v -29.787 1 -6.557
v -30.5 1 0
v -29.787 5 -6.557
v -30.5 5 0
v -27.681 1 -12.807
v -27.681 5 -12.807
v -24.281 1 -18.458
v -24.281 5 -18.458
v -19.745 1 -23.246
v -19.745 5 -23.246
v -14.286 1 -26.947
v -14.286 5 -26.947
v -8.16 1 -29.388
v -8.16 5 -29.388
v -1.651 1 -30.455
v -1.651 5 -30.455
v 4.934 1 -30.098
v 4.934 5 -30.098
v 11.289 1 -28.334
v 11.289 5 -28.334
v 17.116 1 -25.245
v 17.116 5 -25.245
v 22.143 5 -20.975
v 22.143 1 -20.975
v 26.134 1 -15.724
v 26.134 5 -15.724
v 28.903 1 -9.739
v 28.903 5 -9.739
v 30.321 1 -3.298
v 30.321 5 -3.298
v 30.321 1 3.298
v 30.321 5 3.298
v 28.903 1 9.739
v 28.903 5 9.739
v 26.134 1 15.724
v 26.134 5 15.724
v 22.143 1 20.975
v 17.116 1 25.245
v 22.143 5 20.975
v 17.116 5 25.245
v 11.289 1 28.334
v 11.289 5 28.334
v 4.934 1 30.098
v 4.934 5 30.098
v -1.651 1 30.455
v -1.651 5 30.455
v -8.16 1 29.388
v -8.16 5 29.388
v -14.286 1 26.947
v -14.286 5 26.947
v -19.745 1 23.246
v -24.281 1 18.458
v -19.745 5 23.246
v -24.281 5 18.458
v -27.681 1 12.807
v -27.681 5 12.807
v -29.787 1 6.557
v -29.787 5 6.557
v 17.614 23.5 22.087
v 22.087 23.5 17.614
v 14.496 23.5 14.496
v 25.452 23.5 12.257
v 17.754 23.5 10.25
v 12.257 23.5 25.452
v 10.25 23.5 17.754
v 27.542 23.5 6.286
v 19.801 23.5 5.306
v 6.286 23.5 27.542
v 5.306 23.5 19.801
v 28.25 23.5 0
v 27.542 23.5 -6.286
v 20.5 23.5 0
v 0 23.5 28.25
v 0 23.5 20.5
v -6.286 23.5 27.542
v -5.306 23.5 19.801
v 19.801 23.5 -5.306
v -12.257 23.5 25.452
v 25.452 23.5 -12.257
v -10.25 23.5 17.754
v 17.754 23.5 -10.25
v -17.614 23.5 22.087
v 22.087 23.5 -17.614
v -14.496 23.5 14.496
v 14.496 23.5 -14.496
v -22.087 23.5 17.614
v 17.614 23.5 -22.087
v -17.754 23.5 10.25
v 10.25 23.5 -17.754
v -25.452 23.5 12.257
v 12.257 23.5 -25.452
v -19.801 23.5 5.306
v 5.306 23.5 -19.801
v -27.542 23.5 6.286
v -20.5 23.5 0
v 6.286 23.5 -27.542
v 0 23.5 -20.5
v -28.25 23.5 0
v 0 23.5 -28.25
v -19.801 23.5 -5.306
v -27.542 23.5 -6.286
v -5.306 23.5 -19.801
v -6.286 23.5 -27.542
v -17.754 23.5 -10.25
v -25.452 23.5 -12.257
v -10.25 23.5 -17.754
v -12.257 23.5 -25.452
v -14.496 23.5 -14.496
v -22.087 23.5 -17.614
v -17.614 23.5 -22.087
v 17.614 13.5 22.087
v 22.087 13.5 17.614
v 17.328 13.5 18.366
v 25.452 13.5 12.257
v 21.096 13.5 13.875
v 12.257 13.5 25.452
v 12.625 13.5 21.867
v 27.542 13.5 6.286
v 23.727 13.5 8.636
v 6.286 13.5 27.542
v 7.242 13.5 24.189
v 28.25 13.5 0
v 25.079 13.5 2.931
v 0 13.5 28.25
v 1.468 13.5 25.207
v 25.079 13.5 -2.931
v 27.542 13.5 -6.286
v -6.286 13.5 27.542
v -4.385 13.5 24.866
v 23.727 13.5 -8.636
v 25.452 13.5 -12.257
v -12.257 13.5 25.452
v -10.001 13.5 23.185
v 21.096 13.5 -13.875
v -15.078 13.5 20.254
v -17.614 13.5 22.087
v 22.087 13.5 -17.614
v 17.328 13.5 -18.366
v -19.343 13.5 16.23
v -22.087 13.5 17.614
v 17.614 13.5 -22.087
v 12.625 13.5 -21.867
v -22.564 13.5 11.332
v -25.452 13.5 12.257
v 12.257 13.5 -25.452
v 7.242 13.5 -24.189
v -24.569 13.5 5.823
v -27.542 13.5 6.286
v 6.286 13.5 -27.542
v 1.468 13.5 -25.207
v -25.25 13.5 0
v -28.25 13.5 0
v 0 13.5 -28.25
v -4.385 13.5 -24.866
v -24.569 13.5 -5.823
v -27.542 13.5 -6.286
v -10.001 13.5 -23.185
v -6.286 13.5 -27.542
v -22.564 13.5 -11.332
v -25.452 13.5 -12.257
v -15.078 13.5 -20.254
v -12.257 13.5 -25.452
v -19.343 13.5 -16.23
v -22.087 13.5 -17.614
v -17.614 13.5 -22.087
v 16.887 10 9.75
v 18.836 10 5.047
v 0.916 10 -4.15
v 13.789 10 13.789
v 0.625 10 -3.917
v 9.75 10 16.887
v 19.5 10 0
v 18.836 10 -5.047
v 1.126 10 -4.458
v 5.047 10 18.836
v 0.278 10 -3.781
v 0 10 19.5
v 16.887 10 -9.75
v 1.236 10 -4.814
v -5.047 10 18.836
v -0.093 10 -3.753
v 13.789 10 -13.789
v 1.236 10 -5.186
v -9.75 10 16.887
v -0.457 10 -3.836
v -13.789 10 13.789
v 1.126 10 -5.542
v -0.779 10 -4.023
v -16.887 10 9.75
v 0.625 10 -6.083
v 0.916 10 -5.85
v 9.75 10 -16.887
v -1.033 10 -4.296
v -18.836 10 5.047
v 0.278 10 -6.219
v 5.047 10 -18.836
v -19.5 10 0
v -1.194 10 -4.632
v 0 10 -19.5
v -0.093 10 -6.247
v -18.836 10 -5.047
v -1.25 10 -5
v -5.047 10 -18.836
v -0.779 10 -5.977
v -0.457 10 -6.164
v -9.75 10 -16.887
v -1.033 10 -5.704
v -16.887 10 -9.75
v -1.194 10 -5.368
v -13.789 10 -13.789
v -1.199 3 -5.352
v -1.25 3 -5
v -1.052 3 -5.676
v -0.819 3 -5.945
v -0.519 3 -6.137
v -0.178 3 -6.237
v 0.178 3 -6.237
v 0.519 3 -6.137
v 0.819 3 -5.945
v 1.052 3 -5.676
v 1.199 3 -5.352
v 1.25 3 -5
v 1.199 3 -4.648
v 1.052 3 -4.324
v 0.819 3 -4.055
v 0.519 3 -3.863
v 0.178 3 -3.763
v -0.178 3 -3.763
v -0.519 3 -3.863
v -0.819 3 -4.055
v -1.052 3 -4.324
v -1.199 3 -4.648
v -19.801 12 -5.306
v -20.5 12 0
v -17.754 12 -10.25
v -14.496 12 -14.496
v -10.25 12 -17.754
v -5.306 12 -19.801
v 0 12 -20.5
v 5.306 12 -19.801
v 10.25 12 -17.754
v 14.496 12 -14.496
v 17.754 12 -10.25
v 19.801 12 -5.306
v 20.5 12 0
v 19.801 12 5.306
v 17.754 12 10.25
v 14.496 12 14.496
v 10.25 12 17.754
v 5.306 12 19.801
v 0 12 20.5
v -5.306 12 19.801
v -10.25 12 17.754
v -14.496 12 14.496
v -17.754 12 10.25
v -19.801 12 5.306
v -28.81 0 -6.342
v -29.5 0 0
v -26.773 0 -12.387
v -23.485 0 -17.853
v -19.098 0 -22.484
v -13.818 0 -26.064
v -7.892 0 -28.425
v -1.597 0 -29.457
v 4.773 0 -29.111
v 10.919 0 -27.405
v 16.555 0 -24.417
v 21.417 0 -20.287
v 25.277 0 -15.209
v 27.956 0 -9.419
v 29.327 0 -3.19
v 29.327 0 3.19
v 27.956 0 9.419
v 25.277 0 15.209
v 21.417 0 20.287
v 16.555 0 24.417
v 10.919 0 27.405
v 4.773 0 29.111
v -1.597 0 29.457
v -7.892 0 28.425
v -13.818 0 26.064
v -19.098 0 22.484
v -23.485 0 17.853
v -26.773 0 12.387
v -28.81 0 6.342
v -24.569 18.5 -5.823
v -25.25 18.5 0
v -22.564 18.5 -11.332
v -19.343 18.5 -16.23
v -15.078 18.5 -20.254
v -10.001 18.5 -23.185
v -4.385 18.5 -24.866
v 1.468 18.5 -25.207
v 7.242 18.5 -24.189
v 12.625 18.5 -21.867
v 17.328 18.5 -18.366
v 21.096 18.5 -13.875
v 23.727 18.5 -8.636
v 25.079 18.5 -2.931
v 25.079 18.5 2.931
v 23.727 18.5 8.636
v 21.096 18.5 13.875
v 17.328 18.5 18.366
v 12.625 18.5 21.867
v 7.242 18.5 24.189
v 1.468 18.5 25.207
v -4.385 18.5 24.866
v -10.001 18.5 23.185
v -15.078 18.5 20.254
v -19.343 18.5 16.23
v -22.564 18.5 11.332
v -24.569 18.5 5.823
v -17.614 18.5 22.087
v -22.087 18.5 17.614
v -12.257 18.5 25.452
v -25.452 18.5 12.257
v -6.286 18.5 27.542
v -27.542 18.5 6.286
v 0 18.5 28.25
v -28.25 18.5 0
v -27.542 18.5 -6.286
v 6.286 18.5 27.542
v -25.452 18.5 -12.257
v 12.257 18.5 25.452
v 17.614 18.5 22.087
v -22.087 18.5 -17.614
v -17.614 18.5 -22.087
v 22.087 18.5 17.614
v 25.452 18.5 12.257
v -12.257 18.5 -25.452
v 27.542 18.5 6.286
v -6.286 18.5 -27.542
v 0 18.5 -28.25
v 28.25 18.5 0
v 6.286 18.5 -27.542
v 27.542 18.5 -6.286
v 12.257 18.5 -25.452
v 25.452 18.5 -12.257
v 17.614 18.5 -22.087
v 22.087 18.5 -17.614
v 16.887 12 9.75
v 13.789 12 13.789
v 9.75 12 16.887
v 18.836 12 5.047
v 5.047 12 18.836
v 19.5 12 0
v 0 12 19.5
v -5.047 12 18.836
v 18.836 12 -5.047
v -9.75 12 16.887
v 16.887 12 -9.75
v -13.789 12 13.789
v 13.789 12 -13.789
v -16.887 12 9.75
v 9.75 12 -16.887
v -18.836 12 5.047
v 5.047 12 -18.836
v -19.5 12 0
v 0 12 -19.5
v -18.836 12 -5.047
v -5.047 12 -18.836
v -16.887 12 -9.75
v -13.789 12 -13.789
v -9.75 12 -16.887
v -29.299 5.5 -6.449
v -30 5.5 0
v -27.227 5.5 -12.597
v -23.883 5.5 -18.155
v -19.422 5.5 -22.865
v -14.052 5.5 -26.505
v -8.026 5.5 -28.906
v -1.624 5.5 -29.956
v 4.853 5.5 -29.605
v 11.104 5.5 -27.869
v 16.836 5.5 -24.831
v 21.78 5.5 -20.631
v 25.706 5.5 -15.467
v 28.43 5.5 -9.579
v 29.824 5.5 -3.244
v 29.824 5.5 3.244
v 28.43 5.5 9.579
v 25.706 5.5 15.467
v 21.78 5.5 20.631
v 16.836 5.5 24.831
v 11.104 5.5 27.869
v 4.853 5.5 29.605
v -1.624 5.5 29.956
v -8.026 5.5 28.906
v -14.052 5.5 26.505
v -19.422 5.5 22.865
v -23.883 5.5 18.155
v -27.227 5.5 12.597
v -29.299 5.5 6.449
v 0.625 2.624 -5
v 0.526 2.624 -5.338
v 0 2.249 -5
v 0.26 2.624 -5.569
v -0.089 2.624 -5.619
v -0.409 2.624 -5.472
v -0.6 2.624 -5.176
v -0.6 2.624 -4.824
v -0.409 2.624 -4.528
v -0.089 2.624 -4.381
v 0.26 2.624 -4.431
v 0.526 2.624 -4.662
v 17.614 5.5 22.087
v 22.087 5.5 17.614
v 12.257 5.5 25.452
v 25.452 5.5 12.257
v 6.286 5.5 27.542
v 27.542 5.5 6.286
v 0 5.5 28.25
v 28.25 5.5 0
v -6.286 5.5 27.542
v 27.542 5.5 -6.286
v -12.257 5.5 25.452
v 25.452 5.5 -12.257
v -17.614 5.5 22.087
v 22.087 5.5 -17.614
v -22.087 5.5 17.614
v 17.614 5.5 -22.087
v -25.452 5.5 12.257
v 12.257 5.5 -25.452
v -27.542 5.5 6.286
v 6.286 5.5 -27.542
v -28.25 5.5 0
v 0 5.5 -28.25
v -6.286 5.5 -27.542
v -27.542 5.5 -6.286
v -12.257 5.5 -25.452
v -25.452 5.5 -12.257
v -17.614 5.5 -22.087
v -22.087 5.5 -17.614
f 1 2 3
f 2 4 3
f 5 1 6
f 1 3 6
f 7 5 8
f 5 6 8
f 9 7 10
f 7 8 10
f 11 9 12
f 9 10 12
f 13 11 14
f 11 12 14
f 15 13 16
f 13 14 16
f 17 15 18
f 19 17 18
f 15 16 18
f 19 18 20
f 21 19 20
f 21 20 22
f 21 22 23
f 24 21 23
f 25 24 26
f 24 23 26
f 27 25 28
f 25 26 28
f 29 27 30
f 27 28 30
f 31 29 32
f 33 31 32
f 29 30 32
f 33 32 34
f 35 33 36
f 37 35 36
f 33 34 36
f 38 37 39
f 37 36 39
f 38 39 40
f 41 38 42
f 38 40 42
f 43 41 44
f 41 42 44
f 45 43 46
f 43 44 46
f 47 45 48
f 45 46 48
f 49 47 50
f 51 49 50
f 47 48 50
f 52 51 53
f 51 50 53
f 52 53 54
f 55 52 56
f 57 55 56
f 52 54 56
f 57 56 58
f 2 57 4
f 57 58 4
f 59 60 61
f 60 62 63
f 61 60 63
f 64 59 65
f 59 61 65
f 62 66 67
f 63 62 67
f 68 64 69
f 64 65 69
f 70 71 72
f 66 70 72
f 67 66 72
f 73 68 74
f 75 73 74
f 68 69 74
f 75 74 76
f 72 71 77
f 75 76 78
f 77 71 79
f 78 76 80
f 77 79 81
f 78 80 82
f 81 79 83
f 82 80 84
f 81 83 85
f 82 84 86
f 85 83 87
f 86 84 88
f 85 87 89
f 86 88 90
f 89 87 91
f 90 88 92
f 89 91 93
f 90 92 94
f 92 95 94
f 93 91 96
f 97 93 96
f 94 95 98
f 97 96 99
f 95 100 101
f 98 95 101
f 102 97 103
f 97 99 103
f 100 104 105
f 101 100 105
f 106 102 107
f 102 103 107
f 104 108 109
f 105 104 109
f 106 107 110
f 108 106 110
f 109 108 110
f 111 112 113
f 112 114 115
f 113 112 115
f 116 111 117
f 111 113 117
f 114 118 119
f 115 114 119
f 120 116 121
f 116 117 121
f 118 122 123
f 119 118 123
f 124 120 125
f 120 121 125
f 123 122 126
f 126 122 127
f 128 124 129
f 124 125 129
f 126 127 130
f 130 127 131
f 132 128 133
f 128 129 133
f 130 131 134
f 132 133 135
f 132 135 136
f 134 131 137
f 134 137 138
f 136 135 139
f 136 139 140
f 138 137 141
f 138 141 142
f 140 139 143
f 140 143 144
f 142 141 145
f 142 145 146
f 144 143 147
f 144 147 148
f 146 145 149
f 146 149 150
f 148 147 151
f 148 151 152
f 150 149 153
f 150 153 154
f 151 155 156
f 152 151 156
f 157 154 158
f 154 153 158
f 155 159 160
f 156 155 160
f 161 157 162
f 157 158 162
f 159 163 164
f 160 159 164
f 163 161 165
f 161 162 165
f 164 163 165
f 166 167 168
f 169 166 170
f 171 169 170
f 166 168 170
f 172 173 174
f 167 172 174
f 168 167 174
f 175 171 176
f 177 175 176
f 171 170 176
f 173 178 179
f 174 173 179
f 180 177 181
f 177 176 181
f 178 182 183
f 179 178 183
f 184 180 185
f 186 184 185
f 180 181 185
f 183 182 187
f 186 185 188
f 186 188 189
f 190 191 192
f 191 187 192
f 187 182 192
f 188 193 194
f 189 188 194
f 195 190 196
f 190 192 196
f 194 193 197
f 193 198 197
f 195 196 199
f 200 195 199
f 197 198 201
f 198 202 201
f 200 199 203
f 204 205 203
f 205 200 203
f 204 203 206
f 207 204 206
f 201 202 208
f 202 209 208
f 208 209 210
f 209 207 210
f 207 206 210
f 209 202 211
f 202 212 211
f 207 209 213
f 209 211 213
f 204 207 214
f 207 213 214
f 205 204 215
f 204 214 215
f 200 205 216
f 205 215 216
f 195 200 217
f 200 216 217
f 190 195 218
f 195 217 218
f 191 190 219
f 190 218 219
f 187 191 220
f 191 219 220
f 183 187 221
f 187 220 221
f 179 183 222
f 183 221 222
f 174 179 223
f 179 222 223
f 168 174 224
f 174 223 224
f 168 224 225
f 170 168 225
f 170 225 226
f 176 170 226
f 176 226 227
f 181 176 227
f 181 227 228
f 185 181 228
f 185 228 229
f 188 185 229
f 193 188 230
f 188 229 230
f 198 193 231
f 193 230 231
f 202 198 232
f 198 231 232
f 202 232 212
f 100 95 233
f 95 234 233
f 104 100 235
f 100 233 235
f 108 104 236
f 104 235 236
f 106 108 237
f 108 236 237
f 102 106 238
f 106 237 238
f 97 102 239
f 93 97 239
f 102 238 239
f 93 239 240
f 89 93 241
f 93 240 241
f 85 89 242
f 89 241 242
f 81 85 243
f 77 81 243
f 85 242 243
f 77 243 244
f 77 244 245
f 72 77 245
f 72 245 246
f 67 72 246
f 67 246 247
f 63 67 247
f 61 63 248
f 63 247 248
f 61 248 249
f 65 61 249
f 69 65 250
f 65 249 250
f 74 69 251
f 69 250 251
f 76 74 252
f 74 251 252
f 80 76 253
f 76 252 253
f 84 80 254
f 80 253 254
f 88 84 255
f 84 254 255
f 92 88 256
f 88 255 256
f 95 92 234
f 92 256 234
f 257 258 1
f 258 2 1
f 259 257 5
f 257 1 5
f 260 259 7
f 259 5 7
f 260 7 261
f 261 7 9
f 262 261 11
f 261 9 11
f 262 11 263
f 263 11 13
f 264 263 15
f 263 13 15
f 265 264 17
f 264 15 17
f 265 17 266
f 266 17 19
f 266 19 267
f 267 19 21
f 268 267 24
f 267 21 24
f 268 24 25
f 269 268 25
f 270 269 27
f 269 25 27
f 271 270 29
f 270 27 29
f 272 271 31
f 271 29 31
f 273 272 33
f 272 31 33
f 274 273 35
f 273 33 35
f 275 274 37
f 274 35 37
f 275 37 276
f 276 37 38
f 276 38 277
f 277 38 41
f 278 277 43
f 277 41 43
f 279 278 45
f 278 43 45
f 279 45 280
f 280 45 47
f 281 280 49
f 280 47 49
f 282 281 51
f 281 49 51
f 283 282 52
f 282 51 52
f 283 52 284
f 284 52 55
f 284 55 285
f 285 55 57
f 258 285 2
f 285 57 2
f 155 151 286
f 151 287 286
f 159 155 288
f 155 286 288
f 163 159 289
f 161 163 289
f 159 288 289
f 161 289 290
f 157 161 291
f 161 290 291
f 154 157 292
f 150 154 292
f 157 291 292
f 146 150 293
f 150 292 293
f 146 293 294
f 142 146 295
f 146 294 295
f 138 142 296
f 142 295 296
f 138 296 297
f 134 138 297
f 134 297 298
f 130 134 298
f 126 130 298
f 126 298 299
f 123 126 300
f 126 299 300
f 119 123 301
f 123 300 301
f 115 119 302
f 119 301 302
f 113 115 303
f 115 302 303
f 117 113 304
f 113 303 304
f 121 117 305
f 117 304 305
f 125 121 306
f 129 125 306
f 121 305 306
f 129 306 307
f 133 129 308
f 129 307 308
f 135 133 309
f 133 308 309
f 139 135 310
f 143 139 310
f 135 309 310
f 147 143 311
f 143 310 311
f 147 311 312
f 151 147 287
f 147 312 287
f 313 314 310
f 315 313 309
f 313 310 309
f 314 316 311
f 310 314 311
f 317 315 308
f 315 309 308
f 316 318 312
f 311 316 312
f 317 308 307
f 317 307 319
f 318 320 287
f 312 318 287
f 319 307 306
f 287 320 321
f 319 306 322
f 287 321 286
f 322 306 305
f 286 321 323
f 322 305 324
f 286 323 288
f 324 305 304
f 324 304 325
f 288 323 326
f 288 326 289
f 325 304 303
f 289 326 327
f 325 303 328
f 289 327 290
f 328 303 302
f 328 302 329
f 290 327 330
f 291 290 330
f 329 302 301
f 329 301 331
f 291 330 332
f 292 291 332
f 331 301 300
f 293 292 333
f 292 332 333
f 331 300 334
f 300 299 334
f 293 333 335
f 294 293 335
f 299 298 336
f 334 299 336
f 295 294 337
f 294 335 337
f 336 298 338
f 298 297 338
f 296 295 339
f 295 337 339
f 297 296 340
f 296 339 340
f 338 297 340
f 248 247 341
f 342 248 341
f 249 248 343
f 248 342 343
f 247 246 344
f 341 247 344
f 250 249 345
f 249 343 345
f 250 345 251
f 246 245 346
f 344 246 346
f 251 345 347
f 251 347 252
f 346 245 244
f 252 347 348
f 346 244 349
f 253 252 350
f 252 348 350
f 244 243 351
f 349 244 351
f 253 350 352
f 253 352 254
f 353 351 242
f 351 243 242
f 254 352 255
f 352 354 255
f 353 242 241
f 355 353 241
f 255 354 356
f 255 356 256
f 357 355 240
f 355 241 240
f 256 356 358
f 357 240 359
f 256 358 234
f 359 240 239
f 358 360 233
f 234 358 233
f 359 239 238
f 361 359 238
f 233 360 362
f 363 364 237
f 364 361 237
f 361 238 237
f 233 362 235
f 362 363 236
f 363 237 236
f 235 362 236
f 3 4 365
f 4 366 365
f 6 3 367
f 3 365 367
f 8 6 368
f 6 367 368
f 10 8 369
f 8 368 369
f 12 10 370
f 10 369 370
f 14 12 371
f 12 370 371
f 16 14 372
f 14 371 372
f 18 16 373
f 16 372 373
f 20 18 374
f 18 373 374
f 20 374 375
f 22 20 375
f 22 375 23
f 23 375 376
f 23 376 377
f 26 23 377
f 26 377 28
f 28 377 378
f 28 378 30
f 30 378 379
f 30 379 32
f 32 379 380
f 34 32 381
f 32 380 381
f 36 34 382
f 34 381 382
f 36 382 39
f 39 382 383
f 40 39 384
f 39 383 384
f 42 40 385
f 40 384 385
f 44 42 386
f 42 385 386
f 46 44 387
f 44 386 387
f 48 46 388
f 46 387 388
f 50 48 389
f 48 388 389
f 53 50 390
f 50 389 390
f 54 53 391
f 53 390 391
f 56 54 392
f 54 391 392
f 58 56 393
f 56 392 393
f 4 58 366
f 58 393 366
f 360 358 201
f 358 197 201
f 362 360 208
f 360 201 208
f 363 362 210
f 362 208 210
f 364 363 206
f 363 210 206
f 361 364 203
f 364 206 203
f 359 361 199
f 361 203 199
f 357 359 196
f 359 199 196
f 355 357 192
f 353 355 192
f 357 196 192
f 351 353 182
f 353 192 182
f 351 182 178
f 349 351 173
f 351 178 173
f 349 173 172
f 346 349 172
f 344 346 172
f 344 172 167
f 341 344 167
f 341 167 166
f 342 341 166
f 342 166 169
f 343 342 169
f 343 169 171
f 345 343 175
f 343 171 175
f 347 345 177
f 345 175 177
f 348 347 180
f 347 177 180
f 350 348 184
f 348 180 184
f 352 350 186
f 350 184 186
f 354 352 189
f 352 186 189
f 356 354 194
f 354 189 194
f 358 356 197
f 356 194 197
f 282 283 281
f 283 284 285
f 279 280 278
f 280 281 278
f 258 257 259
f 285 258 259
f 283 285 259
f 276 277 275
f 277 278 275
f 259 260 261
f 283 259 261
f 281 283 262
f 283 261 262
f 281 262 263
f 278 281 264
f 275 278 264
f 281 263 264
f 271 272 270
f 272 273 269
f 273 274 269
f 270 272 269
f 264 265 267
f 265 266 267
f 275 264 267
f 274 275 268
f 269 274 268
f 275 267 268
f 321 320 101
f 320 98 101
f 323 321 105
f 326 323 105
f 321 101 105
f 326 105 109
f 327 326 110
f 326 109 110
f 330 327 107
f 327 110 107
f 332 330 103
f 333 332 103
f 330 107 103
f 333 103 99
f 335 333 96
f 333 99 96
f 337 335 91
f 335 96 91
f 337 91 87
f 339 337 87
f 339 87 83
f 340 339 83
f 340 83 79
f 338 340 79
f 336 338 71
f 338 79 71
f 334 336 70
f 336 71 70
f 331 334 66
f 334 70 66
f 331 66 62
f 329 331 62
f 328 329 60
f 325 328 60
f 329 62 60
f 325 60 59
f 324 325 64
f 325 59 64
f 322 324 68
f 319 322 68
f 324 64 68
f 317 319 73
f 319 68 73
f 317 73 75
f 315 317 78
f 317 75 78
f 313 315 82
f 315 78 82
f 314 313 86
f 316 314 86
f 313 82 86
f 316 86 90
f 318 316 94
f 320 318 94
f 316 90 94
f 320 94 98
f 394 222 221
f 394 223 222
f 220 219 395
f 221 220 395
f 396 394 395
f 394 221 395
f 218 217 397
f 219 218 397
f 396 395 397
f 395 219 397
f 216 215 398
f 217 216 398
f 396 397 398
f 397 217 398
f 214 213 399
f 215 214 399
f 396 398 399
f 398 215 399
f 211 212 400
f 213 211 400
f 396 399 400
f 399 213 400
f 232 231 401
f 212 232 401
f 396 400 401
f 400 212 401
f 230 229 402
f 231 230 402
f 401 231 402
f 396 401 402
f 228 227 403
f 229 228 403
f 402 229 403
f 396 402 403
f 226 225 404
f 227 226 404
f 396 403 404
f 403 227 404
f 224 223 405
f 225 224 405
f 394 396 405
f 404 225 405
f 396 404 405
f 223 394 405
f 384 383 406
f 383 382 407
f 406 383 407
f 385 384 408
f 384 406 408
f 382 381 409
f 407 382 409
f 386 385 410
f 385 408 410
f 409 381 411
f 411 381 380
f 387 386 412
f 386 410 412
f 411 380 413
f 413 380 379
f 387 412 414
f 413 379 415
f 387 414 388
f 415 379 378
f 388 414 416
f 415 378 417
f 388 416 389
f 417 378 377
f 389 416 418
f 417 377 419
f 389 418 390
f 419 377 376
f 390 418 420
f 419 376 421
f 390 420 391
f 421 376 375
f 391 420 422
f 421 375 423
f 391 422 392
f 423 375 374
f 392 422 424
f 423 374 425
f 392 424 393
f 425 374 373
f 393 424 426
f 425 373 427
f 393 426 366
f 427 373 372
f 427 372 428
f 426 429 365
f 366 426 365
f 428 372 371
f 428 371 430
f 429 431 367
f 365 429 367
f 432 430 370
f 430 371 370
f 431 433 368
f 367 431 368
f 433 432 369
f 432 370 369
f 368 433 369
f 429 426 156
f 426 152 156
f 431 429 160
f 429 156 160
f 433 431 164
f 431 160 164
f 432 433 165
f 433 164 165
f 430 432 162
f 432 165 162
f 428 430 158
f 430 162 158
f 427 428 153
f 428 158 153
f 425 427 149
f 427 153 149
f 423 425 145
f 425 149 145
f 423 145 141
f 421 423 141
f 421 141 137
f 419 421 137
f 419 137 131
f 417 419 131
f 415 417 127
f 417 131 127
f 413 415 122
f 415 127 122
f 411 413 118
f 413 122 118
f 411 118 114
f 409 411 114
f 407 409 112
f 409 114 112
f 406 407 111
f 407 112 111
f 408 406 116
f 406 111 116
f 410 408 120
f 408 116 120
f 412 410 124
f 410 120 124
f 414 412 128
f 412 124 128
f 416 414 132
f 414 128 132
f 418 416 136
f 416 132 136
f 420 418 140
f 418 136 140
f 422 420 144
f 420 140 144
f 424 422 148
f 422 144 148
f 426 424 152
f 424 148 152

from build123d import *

# Parameters (mm, degrees)
M3X0_51_D     = 2.5
M3X0_51_DEPTH = 7
M3X0_51_TIP   = 0.751075774


with BuildPart() as part:
    # Эскиз1 → Повернуть1 (revolve)
    with BuildSketch(Plane.XY):
        Polygon((0, 0), (-29.5, 0), (-30.5, 1), (-30.5, 5), (-30, 5.5), (-28.25, 5.5), (-28.25, 13.5), (-25.25, 13.5), (-25.25, 18.5), (-28.25, 18.5), (-28.25, 23.5), (-20.5, 23.5), (-20.5, 12), (-19.5, 12), (-19.5, 10), (0, 10), align=None)
    revolve(axis=Axis((0, 10, 0), (0, -1, 0)))

    # Отверстие обработанное метчиком M3x0.51
    with Locations(Plane(origin=(0, 10, -5), x_dir=(1, 0, 0), z_dir=(0, 1, 0))):
        with Locations((0, 0)):
            Hole(M3X0_51_D / 2, depth=M3X0_51_DEPTH)
            with Locations((0, 0, -(M3X0_51_DEPTH + M3X0_51_TIP / 2))):  # 118° drill point
                Cone(0, M3X0_51_D / 2, M3X0_51_TIP, mode=Mode.SUBTRACT)


solid = part.part
